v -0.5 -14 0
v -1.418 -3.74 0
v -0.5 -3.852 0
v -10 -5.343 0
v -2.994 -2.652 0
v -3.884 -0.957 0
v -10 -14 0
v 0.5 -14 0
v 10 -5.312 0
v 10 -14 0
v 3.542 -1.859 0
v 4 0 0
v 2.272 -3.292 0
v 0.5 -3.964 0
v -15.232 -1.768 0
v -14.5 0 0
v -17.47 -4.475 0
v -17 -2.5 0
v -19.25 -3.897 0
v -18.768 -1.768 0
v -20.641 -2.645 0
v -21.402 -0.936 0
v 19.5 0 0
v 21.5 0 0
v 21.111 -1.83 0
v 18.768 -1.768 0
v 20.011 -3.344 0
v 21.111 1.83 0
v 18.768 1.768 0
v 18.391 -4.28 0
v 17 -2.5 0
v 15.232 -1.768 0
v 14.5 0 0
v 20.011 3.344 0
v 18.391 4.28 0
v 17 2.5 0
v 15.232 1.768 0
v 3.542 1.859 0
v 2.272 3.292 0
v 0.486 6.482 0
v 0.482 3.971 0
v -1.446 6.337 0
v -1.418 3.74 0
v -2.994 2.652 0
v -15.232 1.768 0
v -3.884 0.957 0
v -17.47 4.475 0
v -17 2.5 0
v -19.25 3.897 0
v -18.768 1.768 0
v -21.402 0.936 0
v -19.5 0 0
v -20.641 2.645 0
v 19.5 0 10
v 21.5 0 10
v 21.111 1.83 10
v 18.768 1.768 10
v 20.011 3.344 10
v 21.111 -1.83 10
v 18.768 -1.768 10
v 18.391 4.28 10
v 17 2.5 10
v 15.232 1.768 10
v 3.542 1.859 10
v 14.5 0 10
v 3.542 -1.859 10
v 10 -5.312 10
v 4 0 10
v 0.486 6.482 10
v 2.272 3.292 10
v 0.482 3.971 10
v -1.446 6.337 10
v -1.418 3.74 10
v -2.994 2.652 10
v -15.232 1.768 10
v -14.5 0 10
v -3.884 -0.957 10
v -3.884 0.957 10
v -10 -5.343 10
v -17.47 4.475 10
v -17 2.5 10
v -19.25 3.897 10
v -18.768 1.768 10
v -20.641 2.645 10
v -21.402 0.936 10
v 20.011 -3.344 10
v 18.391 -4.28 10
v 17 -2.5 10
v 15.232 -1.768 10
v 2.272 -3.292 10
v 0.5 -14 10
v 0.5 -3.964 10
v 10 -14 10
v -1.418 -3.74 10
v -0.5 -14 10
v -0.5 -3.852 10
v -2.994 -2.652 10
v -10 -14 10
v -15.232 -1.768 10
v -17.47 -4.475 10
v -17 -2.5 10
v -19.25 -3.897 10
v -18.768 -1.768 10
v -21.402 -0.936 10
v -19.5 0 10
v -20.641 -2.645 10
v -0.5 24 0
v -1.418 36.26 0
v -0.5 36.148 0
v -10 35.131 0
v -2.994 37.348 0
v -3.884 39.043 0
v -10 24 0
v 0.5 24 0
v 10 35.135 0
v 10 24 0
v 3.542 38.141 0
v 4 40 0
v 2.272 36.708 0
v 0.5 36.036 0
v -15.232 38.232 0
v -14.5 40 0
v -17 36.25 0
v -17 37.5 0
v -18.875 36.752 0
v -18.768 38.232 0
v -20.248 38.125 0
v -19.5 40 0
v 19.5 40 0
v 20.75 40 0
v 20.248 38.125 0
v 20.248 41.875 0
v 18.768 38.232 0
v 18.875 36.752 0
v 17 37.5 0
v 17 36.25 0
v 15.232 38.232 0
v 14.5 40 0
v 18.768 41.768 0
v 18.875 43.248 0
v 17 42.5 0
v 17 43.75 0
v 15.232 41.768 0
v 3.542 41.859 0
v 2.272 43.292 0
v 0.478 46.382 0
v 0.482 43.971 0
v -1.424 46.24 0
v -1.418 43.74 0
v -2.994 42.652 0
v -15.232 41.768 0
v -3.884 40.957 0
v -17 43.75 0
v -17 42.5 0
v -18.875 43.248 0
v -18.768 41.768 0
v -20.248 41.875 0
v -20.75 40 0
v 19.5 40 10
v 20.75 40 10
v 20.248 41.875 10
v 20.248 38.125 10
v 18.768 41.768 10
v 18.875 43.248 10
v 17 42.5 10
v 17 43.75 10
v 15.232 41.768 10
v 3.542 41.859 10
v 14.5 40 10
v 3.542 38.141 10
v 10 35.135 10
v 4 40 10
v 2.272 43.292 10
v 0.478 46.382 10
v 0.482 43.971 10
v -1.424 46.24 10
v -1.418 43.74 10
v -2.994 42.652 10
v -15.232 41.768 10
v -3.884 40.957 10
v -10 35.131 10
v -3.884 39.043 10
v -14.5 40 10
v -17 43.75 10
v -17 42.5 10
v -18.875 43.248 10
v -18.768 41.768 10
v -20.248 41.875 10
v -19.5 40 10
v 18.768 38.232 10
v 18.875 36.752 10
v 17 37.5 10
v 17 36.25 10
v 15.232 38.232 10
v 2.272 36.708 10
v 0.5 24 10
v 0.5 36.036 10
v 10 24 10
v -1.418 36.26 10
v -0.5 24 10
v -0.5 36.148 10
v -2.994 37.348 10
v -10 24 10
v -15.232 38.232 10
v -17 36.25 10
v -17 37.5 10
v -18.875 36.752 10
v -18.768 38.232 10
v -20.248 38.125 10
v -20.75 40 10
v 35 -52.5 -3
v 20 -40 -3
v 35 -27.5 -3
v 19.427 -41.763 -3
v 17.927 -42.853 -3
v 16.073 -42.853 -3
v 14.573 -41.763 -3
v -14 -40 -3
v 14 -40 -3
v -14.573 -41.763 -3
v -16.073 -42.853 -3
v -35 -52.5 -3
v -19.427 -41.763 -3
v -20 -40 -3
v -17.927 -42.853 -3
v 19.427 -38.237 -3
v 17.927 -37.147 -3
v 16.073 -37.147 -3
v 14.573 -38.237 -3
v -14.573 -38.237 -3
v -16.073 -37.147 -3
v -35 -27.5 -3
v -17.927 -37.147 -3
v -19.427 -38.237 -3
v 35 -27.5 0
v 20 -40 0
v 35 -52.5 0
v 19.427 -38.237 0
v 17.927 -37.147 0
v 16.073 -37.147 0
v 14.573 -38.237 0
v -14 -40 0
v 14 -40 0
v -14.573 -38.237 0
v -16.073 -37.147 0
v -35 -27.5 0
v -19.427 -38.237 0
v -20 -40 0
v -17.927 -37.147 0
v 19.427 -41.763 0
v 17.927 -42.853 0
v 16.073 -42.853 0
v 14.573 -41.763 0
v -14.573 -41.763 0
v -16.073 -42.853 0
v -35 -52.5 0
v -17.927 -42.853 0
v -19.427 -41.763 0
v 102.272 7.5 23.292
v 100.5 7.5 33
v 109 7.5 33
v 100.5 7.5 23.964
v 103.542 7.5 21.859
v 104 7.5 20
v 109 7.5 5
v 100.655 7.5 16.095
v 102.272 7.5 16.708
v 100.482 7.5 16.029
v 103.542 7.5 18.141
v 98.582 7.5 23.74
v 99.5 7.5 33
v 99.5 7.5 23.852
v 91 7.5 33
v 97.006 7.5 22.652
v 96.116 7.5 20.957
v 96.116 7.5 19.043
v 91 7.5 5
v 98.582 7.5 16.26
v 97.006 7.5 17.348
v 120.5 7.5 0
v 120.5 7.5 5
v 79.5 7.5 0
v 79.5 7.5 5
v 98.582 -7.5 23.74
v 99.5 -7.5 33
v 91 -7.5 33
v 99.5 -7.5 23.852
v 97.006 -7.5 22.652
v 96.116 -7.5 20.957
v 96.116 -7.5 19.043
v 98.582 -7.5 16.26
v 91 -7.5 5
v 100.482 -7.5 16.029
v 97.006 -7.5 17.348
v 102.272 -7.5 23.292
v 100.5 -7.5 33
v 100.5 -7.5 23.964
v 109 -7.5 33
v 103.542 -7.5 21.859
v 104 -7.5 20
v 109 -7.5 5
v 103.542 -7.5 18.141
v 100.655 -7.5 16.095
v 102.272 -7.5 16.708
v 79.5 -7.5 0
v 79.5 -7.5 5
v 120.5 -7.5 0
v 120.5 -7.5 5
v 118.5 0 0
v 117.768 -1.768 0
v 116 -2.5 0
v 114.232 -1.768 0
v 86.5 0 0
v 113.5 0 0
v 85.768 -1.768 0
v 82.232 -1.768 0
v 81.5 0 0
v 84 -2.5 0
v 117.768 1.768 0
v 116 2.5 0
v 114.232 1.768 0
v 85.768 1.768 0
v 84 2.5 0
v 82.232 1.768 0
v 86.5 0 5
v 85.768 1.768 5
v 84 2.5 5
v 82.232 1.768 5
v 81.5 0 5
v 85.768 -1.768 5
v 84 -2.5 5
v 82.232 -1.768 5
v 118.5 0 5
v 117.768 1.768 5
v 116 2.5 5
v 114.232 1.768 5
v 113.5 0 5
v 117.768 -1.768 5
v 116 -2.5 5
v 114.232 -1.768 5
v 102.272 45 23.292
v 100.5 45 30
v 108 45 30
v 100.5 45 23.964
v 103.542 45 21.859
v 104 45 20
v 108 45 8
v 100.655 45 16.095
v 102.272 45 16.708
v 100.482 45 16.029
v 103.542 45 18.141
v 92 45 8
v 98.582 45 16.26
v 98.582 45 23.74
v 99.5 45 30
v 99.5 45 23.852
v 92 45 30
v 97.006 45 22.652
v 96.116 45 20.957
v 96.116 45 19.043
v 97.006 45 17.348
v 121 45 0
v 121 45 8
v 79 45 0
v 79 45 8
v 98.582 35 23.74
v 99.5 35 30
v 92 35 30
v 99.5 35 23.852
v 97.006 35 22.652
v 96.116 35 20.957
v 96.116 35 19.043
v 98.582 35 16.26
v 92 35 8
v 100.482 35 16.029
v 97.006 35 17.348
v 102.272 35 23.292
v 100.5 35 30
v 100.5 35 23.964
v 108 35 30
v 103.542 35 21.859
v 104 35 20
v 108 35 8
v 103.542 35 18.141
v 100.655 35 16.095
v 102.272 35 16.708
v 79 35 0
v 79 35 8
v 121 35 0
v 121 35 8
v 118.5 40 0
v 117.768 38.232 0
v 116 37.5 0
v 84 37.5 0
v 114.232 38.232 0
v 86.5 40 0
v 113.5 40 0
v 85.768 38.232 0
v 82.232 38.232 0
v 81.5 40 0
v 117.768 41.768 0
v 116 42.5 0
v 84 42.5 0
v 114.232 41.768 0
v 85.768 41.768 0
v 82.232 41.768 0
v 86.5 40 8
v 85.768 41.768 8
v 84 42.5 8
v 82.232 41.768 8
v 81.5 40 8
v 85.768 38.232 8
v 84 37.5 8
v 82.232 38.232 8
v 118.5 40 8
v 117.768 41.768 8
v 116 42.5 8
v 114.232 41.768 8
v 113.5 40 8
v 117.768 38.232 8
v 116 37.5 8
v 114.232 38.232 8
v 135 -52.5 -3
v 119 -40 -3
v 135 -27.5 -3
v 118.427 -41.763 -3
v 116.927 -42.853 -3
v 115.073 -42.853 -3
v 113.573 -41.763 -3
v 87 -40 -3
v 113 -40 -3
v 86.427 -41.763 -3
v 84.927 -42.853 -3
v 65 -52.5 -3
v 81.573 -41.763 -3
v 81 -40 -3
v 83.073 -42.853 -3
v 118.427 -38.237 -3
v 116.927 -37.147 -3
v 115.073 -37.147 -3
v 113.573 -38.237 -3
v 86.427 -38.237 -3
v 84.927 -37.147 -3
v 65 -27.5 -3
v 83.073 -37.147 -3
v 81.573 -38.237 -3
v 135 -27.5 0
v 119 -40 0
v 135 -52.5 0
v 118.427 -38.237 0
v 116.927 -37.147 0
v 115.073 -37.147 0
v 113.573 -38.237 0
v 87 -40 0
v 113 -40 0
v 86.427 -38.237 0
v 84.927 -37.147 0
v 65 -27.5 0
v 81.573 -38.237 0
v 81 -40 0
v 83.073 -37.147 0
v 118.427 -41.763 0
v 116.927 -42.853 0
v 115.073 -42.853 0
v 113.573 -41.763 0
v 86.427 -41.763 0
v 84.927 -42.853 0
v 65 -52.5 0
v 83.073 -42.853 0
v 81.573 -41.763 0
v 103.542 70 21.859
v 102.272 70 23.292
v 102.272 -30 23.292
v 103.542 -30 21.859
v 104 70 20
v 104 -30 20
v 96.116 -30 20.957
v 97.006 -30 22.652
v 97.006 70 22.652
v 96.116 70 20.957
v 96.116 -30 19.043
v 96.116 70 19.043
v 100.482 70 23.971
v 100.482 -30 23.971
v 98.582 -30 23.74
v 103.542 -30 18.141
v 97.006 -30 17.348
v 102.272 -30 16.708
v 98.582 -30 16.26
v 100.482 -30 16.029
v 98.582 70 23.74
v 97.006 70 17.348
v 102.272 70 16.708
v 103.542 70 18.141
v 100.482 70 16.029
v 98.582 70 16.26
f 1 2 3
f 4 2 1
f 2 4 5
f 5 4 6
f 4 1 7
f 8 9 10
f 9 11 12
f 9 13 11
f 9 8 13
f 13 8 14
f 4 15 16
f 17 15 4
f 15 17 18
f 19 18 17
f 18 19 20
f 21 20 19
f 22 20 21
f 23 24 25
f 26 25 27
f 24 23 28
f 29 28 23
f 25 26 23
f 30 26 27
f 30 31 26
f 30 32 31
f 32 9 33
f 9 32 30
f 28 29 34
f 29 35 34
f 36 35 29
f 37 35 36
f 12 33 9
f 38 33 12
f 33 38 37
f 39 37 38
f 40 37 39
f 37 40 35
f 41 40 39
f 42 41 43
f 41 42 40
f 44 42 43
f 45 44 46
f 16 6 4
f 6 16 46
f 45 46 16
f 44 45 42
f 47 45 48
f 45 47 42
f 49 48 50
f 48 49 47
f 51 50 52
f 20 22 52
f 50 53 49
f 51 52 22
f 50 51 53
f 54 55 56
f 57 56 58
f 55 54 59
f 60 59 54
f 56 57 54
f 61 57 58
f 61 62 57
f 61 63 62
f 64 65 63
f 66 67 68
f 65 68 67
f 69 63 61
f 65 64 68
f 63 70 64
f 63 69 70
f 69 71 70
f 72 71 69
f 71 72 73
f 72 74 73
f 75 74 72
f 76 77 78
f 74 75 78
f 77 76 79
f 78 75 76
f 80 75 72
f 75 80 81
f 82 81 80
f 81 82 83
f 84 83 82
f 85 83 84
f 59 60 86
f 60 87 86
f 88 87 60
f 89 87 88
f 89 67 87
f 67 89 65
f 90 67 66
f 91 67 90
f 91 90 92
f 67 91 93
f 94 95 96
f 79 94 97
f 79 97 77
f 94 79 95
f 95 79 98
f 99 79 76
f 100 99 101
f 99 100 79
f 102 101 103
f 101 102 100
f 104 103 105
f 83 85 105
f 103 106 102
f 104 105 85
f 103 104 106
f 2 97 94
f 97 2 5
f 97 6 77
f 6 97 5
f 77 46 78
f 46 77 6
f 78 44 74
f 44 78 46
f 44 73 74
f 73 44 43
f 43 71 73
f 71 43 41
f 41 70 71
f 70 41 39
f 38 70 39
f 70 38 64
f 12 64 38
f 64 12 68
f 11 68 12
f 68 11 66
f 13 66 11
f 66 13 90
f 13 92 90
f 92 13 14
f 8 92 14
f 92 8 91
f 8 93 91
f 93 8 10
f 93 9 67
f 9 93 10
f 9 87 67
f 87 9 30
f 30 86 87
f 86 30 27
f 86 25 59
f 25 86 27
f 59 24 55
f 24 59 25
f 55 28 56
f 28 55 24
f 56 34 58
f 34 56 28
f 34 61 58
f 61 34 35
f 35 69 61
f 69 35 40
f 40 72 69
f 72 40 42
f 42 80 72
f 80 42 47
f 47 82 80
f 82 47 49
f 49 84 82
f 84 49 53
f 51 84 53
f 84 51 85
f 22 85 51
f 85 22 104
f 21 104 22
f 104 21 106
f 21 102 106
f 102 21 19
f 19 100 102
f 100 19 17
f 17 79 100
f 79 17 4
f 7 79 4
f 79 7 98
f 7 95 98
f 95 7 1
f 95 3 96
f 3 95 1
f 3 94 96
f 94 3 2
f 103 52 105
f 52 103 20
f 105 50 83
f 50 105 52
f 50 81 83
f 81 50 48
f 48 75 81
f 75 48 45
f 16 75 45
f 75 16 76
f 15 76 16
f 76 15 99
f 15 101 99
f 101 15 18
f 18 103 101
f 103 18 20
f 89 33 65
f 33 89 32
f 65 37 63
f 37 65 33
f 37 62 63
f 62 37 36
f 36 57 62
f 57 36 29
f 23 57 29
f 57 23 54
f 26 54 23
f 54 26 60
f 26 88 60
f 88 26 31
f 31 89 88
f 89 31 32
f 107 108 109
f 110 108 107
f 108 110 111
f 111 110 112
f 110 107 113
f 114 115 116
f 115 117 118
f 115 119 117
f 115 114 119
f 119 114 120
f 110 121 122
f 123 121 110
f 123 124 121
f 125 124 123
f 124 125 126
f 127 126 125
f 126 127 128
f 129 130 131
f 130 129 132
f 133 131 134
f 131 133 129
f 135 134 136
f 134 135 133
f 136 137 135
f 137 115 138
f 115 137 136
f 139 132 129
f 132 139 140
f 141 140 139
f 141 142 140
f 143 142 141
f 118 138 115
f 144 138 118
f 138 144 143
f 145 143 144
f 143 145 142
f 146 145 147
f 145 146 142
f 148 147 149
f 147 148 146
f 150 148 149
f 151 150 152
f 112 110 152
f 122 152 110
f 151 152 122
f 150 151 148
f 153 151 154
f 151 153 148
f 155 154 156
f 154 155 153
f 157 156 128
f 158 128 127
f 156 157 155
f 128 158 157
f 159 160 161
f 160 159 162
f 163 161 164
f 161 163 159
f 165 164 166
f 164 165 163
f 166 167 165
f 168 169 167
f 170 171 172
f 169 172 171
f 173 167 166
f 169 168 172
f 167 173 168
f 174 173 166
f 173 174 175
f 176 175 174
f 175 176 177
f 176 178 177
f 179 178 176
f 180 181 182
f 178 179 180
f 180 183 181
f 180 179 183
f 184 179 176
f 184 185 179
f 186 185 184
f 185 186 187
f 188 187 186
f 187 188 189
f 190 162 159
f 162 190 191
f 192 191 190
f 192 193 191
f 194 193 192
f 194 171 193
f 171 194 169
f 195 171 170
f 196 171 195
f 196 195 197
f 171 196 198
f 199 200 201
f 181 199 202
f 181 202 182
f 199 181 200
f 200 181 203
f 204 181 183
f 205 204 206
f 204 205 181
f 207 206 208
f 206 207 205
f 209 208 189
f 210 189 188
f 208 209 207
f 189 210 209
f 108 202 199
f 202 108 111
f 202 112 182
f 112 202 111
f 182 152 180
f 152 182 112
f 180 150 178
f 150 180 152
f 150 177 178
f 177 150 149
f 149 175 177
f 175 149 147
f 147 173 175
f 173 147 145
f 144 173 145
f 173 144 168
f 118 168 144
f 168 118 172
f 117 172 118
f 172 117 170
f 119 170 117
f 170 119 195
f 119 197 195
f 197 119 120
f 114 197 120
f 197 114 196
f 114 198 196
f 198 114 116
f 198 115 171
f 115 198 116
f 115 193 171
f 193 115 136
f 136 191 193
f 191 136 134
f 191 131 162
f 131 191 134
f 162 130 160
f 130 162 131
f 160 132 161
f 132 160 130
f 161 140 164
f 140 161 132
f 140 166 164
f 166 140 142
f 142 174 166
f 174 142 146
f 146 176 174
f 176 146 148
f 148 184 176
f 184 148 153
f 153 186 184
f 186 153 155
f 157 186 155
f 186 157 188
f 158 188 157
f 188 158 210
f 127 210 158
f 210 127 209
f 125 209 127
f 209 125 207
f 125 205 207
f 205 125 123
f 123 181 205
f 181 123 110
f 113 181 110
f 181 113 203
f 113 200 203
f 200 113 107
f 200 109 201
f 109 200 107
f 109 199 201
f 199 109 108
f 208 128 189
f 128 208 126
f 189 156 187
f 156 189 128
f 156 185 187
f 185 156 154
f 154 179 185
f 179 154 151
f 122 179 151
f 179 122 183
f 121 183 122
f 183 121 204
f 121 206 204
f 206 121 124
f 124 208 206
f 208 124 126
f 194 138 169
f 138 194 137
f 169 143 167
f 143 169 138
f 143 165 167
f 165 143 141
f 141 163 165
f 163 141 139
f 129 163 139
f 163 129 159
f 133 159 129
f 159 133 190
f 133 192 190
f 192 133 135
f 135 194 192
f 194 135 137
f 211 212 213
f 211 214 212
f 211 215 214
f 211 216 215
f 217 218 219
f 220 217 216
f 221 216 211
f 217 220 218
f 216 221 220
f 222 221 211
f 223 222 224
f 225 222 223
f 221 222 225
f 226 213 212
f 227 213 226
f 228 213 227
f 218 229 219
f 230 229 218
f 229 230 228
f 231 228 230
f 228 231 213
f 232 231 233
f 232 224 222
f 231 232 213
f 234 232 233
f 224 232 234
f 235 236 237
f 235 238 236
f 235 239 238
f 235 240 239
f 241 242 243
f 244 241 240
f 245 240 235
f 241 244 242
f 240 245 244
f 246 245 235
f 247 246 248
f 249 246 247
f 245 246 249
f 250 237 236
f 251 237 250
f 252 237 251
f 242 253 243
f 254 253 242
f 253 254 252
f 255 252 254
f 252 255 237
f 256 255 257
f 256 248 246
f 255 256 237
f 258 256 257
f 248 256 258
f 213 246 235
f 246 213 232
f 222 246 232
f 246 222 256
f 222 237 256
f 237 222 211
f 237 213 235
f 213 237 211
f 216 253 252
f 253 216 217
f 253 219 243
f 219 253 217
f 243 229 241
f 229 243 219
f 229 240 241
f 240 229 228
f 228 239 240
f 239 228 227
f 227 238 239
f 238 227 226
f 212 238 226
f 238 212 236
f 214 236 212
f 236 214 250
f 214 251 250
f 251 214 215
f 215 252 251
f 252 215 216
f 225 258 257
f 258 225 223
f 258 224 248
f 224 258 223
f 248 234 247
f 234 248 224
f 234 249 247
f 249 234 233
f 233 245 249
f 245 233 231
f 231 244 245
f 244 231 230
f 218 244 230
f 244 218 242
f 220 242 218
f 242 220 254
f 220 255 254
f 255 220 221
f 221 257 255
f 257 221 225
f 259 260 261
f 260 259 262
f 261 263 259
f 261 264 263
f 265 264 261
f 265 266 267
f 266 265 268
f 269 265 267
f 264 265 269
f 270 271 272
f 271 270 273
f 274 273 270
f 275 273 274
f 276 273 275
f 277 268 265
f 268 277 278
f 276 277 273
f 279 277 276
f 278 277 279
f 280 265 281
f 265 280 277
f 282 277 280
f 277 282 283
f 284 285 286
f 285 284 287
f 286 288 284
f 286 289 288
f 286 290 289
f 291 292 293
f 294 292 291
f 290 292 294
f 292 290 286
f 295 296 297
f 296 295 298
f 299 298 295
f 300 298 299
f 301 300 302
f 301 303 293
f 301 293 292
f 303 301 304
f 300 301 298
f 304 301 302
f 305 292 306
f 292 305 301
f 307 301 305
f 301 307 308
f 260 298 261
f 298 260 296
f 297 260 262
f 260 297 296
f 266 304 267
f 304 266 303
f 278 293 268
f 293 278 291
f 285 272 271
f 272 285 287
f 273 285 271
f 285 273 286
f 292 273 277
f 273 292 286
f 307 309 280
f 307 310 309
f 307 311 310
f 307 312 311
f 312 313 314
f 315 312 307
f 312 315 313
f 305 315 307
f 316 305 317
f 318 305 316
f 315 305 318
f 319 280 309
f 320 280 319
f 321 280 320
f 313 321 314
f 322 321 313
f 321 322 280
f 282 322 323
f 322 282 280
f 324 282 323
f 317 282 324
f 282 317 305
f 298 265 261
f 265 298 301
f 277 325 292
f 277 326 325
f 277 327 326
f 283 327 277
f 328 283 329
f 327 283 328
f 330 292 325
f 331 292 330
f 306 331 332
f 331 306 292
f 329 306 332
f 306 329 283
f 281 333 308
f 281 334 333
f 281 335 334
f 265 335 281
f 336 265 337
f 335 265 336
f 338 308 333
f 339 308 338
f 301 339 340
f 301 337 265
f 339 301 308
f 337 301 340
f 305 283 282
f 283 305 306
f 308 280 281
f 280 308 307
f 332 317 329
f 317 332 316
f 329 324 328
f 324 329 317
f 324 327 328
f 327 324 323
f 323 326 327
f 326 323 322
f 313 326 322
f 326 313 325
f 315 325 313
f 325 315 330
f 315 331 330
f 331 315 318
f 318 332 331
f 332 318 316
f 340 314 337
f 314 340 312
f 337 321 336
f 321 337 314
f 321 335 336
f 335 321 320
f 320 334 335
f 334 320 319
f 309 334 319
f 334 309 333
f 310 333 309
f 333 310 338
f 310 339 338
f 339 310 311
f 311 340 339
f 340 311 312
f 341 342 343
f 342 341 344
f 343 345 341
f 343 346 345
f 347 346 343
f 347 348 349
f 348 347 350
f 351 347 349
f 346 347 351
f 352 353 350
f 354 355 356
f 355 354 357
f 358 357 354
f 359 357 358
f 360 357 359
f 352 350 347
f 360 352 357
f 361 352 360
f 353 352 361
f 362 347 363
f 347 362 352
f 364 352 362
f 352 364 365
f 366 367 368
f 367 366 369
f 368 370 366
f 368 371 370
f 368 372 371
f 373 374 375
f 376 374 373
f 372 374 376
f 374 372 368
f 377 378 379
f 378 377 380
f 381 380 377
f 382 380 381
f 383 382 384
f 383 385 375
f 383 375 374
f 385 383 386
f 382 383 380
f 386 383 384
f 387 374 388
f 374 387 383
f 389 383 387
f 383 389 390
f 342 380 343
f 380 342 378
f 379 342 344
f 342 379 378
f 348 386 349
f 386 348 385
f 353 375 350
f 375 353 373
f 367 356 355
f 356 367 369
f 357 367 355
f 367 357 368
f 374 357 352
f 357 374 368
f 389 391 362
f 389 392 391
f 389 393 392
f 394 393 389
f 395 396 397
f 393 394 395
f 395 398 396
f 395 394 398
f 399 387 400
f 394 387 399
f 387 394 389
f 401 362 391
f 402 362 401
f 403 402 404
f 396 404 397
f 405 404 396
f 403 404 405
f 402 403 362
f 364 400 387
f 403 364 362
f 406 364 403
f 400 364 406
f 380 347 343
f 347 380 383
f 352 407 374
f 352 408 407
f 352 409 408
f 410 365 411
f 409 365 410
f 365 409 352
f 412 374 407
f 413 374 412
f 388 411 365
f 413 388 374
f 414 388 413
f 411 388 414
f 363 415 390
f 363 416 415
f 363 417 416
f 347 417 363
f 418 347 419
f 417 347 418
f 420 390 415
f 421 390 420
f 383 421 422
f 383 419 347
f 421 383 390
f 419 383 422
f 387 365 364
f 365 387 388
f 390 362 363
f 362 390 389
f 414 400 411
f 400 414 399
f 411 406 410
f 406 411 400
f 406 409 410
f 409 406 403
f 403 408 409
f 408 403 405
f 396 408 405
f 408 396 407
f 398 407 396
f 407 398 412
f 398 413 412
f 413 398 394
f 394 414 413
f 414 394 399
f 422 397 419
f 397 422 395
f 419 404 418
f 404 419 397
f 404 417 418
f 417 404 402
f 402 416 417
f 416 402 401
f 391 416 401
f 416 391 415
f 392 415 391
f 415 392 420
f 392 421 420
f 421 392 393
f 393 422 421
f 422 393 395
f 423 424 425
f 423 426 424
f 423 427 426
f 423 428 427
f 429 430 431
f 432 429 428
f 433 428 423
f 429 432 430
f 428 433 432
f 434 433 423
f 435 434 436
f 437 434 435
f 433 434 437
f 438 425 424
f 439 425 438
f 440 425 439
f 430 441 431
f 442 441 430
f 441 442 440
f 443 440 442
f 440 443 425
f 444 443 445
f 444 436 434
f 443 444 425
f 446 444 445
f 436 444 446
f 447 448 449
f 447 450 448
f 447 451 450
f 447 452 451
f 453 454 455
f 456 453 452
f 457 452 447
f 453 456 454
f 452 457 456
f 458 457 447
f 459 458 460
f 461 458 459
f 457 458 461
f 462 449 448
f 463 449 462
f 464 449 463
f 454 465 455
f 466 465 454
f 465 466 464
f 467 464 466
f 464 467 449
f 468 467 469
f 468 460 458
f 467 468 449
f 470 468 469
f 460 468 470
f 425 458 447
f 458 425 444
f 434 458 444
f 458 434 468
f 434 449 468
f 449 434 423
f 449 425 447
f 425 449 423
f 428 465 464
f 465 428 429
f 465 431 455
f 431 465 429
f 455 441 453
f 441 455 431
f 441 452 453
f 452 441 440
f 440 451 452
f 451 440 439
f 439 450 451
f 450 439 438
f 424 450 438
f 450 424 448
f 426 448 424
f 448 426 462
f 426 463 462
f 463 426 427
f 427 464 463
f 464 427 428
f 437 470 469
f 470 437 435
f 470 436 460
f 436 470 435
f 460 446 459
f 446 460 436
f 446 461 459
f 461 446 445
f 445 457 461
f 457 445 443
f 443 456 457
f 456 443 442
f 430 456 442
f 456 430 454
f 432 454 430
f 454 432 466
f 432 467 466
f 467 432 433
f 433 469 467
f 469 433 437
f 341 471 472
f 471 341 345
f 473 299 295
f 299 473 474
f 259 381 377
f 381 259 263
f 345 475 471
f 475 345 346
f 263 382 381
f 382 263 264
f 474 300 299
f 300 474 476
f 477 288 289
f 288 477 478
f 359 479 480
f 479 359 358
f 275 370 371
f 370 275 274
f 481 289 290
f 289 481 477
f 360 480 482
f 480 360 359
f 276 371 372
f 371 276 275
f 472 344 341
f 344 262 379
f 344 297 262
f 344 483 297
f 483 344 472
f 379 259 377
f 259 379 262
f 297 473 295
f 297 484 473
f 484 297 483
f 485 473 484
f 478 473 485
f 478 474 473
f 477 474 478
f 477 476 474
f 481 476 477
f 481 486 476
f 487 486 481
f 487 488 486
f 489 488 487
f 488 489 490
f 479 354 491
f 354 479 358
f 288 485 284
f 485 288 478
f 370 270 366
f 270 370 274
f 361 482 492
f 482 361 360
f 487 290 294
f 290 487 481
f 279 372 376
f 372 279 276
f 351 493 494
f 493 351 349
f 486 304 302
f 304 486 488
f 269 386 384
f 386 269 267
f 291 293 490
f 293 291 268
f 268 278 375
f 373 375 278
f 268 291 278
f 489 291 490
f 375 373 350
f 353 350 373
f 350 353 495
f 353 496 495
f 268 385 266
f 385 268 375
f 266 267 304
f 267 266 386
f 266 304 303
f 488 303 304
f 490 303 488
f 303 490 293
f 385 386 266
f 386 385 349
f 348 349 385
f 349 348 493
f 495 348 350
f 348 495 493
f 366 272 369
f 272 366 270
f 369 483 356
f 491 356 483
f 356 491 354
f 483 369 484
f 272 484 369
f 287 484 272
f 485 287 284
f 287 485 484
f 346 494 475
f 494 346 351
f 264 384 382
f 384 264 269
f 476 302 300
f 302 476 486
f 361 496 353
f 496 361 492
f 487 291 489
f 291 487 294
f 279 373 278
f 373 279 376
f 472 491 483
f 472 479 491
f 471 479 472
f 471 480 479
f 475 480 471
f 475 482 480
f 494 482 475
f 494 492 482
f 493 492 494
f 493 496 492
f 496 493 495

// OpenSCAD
//
// LINEAR RAILS
// by ISC 2021-09
//
// rough visual representation only
// accurate measurement/holes for product design
//
// not sure if SHF and SK are official names
// based it off what the seller calls them
//
// SHF:
//     profile = LinearRailHolderSHFProfile( ... ) - create profile
//     LinearRailHolderSHF( profile )              - draw 3D
//     LinearRailHolderSHFPanelHole( profile )     - draw 2D panel holes
//
// SK:
//     profile = LinearRailHolderSKProfile( ... ) - create profile
//     LinearRailHolderSK( profile )              - draw 3D
//     LinearRailHolderSKPanelHole( profile )     - draw 2D panel holes
//

include <KVTree.scad>
include <utility.scad>

//
// DEMO
//

    // run me!!!
                         LinearRailHolderSHF_Demo();
    translate([100,0,0]) LinearRailHolderSK_Demo();

    module LinearRailHolderSHF_Demo() {
        profile = LinearRailHolderSHFProfile(
            model              = "SHF8",
            shaftDiameter      = 8,
            boltDistance       = 34,
            width              = 34+5+2+2, // overall width
            centerRingDiameter = 8+5,
            baseHeight         = 14,       // shaft center to base bottom
            baseWidth          = 20,
            slit               = 1    
        );
        profileAuto = LinearRailHolderSHFProfile(
            model         = "SHF8-auto",
            shaftDiameter = 8,
            boltDistance  = 34
        );

        LinearRailHolderSHF( profile );
        kvEchoAligned( profile );
        
        translate([0,40,0])
            LinearRailHolderSHF( profileAuto );
        
        translate([0,-40,-3])
        linear_extrude(3)
        difference() {
            square([70,25],center=true);
            LinearRailHolderSHFPanelHole( profile );
        }
    }

    module LinearRailHolderSK_Demo() {
        profileAuto = LinearRailHolderSKProfile(
            model         = "SK8-auto",
            shaftDiameter = 8,
            shaftHeight   = 20,
            boltDistance  = 32
        );
        profile = LinearRailHolderSKProfile(
            model = "SK8",
            shaftDiameter = 8,
            shaftHeight   = 20, // floor to shaft center
            boltDiameter  = 5, 
            boltDistance  = 32,
            width         = 18,
            height        = 33, // overall height
            thickness     = 15,
            baseWidth     = 41,
            baseHeight    = 5,
            slit          = 1
        );
        
        LinearRailHolderSKProfile( profile );
        kvEchoAligned( profile );
        
        translate([0,40,0])
            LinearRailHolderSKProfile( profileAuto );
        
        translate([0,-40,-3])
        linear_extrude(3)
        difference() {
            square([70,25],center=true);
            LinearRailHolderSKPanelHole( profile );
        }
        
        shaftHeight = kvGet(profile, "shaft.height" );
        color("green")
        translate([0,20,shaftHeight])
        rotate([90,0,0])
            cylinder(100,d=8,center=true);
    }
    
//
// HOLDER SHF
//

    function LinearRailHolderSHFProfile(
        model              = "",
        shaftDiameter,
        boltDiameter       = 5,
        boltDistance,               // bolt to bolt distance
        thickness          = 10,
        width              = undef, // overall width
        centerRingDiameter = undef, // diameter of ring around shaft
        baseHeight         = undef, // shaft center to base bottom
        baseWidth          = undef,
        slit               = 1      // clamp slit width on base
    ) = let (
        e1=ErrorIf( shaftDiameter==undef, "shaft diameter missing" ),
        e2=ErrorIf( boltDistance ==undef, "bolt distance missing"  ),
        eWidth      = SELECT( width     , boltDistance+boltDiameter*1.5 ),
        eRD         = SELECT( centerRingDiameter, shaftDiameter*1.6 ),
        eBaseHeight = SELECT( baseHeight, shaftDiameter*2 ),
        eBaseWidth  = SELECT( baseWidth , shaftDiameter*2.5 )
    ) KVTree([
        "type"         , "linear rail holder SHF",
        "model"        , model,
        "shaftDiameter", shaftDiameter,
        "bolt"         , KVTree([ "diameter", boltDiameter, "distance", boltDistance ]),
        "body"         , KVTree([ "width", eWidth, "ringDiameter", eRD, "thickness", thickness ]),
        "base"         , KVTree([ "width", eBaseWidth, "height", eBaseHeight, "slit", slit ])
    ]);

    module LinearRailHolderSHF( profile ) {
        t = kvSearch(profile,"type");
        e1=ErrorIf( t!="linear rail holder SHF", "LinearRailHolderSHF(): invalid profile" );
        go();
        module go() {
            shaftDiameter = kvGet(profile, "shaftDiameter" );
            boltDiameter  = kvGet(profile, "bolt.diameter" );
            boltToBolt    = kvGet(profile, "bolt.distance" );
            body = kvGet(profile,"body");
            width        = kvGet(body, "width"        );
            ringDiameter = kvGet(body, "ringDiameter" );
            thickness    = kvGet(body, "thickness"    );
            base = kvGet(profile,"base");            
            baseWidth    = kvGet(base, "width"  );
            baseHeight   = kvGet(base, "height" );
            slitWidth    = kvGet(base, "slit"   );
            sideDiameters = width - boltToBolt;
            linear_extrude(thickness)
            difference() {
                union() {
                    hull() {
                        translate([-boltToBolt/2,0,0])
                            circle(d=sideDiameters);
                        translate([boltToBolt/2,0,0])
                            circle(d=sideDiameters);
                        circle(d=ringDiameter);
                    }
                    translate([0,-baseHeight/2])
                        square([baseWidth,baseHeight],center=true);
                }
                union() {
                    translate([-boltToBolt/2,0,0])
                        circle(d=boltDiameter);
                    translate([boltToBolt/2,0,0])
                        circle(d=boltDiameter);
                    circle(d=shaftDiameter);
                    translate([0,-baseHeight/2])
                        square([slitWidth,baseHeight],center=true);        
                }
            }
        }
    }

    module LinearRailHolderSHFPanelHole( profile, omitCenterHole=true, enlargeShaft=1, enlargeBolt=1 ) {
        t = kvSearch(profile,"type");
        e1=ErrorIf( t!="linear rail holder SHF", "LinearRailHolderSHFPanelHole(): invalid profile" );
        go();
        module go() {
            shaftDiameter = kvGet(profile, "shaftDiameter" );
            boltDiameter  = kvGet(profile, "bolt.diameter" );
            boltToBolt    = kvGet(profile, "bolt.distance" );
            b2b2          = boltToBolt/2;
            if ( !omitCenterHole )
                circle( d=shaftDiameter+enlargeShaft );
            translate( [ b2b2,0,0] ) circle( d=boltDiameter+enlargeBolt );
            translate( [-b2b2,0,0] ) circle( d=boltDiameter+enlargeBolt );
        }
    }
    
    /*
    boltDistance=34;
    boltDiameter=5;
    shaftDiameter=8;
    centerDiameter=18;
    sideDiameter=9;
    baseHeight=14;
    baseWidth=20;
    slitWidth=1;

    difference() {
        union() {
            hull() {
                translate([-boltDistance/2,0,0])
                    circle(d=sideDiameter);
                translate([boltDistance/2,0,0])
                    circle(d=sideDiameter);
                circle(d=centerDiameter);
            }
            translate([0,-baseHeight/2])
                square([baseWidth,baseHeight],center=true);
        }
        union() {
            translate([-boltDistance/2,0,0])
                circle(d=boltDiameter);
            translate([boltDistance/2,0,0])
                circle(d=boltDiameter);
            circle(d=shaftDiameter);
            translate([0,-baseHeight/2])
                square([slitWidth,baseHeight],center=true);        
        }
    }
    */

//
// HOLDER SK
//

    function LinearRailHolderSKProfile(
        model = "",
        shaftDiameter,
        shaftHeight,          // floor to shaft center
        boltDiameter = 5,        
        boltDistance,         // bolt to bolt distance
        thickness    = 10,
        width        = undef, // width of shaft holder
        height       = undef, // overall height
        baseWidth    = undef,
        baseHeight   = 8,
        slit         = 1
    ) = let (
        e1=ErrorIf( shaftDiameter==undef, "shaft diameter missing" ),
        e2=ErrorIf( shaftHeight  ==undef, "shaft height missing"   ),
        e3=ErrorIf( boltDistance ==undef, "bolt distance missing"  ),
        
        eWidth      = SELECT( width     , shaftDiameter*2 ),
        eHeight     = SELECT( height    , shaftHeight+boltDiameter*2 ),
        eBaseWidth  = SELECT( baseWidth , boltDistance+boltDiameter*2 ),
        eBaseHeight = SELECT( baseHeight, shaftDiameter*2 )
    ) KVTree([
        "type"         , "linear rail holder SK",
        "model"        , model,
        "shaft"        , KVTree([ "diameter", shaftDiameter, "height", shaftHeight ]),
        "bolt"         , KVTree([ "diameter", boltDiameter, "distance", boltDistance ]),
        "body"         , KVTree([ "width", eWidth, "height", eHeight, "thickness", thickness, "slit", slit ]),
        "base"         , KVTree([ "width", eBaseWidth, "height", eBaseHeight ])
    ]);

    module LinearRailHolderSKProfile( profile ) {
        t = kvSearch(profile,"type");
        e1=ErrorIf( t!="linear rail holder SK", "LinearRailHolderSKProfile(): invalid profile" );
        go();
        module go() {
            shaftDiameter = kvGet(profile, "shaft.diameter" );
            shaftHeight   = kvGet(profile, "shaft.height" );
            boltDiameter  = kvGet(profile, "bolt.diameter" );
            boltToBolt    = kvGet(profile, "bolt.distance" );
            body = kvGet(profile,"body");
            width     = kvGet(body, "width"     );
            height    = kvGet(body, "height"    );
            thickness = kvGet(body, "thickness" );
            slitWidth = kvGet(body, "slit"      );
            base = kvGet(profile,"base");
            baseWidth  = kvGet(base, "width"  );
            baseHeight = kvGet(base, "height" );
            
            rotate([90,0,0])
            linear_extrude(thickness,center=true)
            difference() 
            {
                translate([-width/2,0,0])
                    square([width,height]);
                union() {
                    translate([0,shaftHeight,0])
                        circle(d=shaftDiameter);
                    slitHeight=height-shaftHeight;
                    translate([-slitWidth/2,height-slitHeight,0])
                        square([slitWidth,slitHeight+1]);
                }
            }
            linear_extrude(baseHeight)
            difference() {
                square([baseWidth,thickness],center=true);
                union() {
                    translate([-boltToBolt/2,0,0])
                        circle(d=boltDiameter);
                    translate([boltToBolt/2,0,0])
                        circle(d=boltDiameter);
                }
            }
        }
    }

    module LinearRailHolderSKPanelHole( profile, enlargeBolt=1 ) {
        t = kvSearch(profile,"type");
        e1=ErrorIf( t!="linear rail holder SK", "LinearRailHolderSKPanelHole(): invalid profile" );
        go();
        module go() {
            boltDiameter  = kvGet(profile, "bolt.diameter" );
            boltToBolt    = kvGet(profile, "bolt.distance" );
            b2b2          = boltToBolt/2;
            translate( [ b2b2,0,0] ) circle( d=boltDiameter+enlargeBolt );
            translate( [-b2b2,0,0] ) circle( d=boltDiameter+enlargeBolt );
        }
    }
    
    /*
    boltDistance=32;
    boltDiameter=5;

    shaftDiameter=8;
    shaftHeight=20;

    width=18;
    height=33;
    thickness=15;

    baseWidth=41;
    baseHeight=5;
    slit=1;

    rotate([90,0,0])
    linear_extrude(thickness,center=true)
    difference() 
    {
        translate([-width/2,0,0])
            square([width,height]);
        union() {
            translate([0,shaftHeight,0])
                circle(d=shaftDiameter);
            slitHeight=height-shaftHeight;
            translate([-slit/2,height-slitHeight,0])
                square([slit,slitHeight+1]);
        }
    }
    linear_extrude(baseHeight)
    difference() {
        square([baseWidth,thickness],center=true);
        union() {
            translate([-boltDistance/2,0,0])
                circle(d=boltDiameter);
            translate([boltDistance/2,0,0])
                circle(d=boltDiameter);
        }
    }
    */
